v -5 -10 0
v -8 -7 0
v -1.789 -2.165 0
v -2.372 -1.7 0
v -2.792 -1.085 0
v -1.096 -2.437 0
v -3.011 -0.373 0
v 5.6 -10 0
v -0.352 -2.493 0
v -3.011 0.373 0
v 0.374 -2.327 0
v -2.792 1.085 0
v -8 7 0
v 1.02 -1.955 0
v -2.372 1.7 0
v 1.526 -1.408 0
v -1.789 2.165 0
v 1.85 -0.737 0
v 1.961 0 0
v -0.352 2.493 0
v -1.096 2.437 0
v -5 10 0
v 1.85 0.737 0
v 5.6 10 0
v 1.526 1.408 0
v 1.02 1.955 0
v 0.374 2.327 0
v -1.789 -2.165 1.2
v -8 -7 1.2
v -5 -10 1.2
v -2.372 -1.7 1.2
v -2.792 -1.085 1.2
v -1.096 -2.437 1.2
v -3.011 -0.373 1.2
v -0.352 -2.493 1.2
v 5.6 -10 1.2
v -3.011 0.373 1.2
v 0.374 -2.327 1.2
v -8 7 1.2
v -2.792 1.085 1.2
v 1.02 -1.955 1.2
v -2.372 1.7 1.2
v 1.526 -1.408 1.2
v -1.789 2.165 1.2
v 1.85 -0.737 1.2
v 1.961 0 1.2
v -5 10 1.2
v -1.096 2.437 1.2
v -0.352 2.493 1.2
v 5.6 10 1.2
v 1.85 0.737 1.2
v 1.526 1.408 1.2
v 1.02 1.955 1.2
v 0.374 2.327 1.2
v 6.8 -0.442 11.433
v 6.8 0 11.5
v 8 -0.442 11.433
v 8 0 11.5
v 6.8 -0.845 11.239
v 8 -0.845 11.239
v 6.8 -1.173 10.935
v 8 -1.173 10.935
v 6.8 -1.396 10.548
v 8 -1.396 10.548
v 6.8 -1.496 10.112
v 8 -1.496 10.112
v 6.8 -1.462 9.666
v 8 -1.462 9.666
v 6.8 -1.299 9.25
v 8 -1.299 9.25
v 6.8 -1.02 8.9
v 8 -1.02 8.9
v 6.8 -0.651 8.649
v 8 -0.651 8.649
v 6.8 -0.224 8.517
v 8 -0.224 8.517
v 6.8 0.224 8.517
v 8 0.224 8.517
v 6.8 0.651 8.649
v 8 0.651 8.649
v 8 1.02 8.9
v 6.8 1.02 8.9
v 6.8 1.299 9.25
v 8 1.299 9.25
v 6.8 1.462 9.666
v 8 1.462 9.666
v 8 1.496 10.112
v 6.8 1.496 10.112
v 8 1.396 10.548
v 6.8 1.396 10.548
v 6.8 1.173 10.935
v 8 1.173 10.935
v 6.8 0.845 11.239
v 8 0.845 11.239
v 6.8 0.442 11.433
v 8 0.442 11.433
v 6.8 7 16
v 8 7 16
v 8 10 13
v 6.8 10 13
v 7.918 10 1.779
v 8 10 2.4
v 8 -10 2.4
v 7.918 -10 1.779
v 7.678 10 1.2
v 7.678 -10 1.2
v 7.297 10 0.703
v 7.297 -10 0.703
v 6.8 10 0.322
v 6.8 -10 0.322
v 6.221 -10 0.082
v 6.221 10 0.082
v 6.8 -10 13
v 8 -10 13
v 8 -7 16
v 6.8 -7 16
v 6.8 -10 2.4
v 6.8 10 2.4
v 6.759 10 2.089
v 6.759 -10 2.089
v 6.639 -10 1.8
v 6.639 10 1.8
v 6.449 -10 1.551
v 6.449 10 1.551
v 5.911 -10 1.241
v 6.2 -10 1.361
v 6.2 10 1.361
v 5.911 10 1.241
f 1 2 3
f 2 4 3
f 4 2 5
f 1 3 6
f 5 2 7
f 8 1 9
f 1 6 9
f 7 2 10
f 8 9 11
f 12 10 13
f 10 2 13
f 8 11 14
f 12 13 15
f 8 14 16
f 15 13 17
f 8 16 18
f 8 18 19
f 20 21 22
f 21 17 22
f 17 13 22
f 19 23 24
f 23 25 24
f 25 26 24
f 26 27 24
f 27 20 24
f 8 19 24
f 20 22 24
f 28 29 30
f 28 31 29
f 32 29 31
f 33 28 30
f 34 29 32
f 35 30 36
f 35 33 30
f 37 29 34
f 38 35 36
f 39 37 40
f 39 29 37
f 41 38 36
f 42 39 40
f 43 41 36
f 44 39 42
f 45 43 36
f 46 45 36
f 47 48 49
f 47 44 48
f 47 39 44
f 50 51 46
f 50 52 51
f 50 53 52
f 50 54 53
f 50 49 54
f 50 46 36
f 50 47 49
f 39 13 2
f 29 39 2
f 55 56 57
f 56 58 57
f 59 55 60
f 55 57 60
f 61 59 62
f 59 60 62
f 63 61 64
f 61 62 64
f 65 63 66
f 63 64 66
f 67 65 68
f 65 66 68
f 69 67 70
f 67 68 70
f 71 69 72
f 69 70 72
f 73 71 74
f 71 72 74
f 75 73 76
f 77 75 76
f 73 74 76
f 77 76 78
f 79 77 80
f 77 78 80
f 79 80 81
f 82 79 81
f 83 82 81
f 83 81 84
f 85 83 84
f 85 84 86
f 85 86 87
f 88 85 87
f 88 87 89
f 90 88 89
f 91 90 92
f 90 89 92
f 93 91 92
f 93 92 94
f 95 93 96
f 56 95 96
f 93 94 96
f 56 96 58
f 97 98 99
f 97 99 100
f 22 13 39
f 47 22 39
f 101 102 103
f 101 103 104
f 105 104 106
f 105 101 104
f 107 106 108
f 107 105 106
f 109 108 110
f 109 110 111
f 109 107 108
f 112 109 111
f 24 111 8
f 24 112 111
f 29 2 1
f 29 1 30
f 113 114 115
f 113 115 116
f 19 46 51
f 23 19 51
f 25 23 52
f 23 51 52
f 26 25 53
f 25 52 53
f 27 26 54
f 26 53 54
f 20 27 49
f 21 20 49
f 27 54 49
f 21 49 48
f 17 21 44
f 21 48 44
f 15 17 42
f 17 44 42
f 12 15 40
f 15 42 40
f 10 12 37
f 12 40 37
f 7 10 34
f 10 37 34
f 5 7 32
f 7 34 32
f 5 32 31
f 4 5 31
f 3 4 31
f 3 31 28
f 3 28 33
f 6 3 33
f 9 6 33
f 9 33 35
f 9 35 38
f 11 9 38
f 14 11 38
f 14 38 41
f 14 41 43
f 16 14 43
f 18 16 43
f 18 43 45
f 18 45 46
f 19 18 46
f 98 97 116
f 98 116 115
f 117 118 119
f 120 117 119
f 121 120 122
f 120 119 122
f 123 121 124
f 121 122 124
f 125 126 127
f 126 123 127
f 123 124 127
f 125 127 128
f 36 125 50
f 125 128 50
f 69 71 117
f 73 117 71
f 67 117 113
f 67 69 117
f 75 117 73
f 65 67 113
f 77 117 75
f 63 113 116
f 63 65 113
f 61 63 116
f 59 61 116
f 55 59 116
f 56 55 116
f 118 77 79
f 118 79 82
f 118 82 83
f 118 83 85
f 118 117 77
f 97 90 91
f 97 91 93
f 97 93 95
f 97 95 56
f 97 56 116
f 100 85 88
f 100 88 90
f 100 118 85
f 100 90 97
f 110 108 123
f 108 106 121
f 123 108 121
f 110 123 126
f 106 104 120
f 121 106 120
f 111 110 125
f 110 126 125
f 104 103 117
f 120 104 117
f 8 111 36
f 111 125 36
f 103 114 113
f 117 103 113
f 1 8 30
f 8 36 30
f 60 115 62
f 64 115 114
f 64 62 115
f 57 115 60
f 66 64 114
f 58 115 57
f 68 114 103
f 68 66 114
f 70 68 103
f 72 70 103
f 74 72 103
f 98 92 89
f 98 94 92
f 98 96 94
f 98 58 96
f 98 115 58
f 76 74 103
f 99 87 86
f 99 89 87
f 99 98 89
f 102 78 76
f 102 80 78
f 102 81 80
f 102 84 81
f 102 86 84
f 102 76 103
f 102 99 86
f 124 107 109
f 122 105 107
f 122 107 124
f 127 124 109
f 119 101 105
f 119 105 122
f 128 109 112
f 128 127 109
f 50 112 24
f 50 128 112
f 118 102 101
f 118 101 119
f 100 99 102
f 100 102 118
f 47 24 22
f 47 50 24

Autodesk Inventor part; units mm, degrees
ref_plane "YZ Plane" through (0, 0, 0) normal (1, 0, 0) x (0, 1, 0)
ref_plane "XZ Plane" through (0, 0, 0) normal (0, 1, 0) x (-1, 0, 0)
ref_plane "XY Plane" through (0, 0, 0) normal (0, 0, 1) x (1, 0, 0)
sketch "Sketch1" plane through (0, 0, 0) normal (0, 0, 1) x (1, 0, 0)
  line L0 (-8, -10) -> (8, -10)
  line L1 (8, -10) -> (8, 10)
  line L2 (8, 10) -> (-8, 10)
  line L3 (-8, 10) -> (-8, -10)
  line L4 (-8, -10) -> (8, 10) construction
  line L5 (8, -10) -> (-8, 10) construction
  point P0 (0, 0)
  dimension "d0" = 16
  dimension "d1" = 20
extrude "Plate1" add sketch "Sketch1" along normal blind 1.2
sketch "Sketch2" plane through (6.8, 10, 0) normal (1, 0, 0) x (0, 1, 0)
  line L0 (-20, 0) -> (0, 0)
  line L1 (0, 0) -> (0, 16)
  line L2 (0, 16) -> (-20, 16)
  line L3 (-20, 16) -> (-20, 0)
edge flange "Flange1" height 16 angle 90 thickness 1.2 bend radius 1.2 thickness toward (1, 0, 0) relief tear relief width 1.2 relief depth 0.6 edges at (8, 0, 1.2) wall of the first edge with corners at (6.8, -10, 0) (6.8, 10, 0) (6.8, 10, 16) (6.8, -10, 16)
bend "Bend1"
corner "Corner1"
chamfer "Corner Chamfer1" distance 3 angle 45 4 edges at (-8, 10, 0.6) (-8, -10, 0.6) (7.4, -10, 16) (7.4, 10, 16)
sketch "Sketch3" plane through (6.8, -10, 2.4) normal (-1, 0, 0) x (0, 0, 1)
  line L0 (13.6, 3) -> (13.6, 17) projected
  line L1 (-2.4, 17) -> (-2.4, 3) projected
  point P0 (-2.4, 10)
  point P1 (7.6, 10)
  point P2 (-2.4, 10)
  dimension "d16" = 6
hole "Hole1" at (6.8, 0, 10) direction (1, 0, 0) diameter 3 depth 1.2 tip angle 118
sketch "Sketch4" plane through (0, 0, 1.2) normal (0, 0, 1) x (1, 0, 0)
  circle A0 centre (-0.5392, 0) radius 2.1 construction
  circle A1 centre (-0.5392, 0) radius 2.5
  point P0 (0, 0)
  dimension "d24" = 0.4
extrude "Cut1" cut sketch "Sketch4" against normal blind 1.2
equation "\"d22\" = Thickness"
equation "\"d25\" = Thickness"
equation "\"d3\" = BendReliefWidth"
equation "\"d4\" = BendReliefDepth"
equation "\"d5\" = MinimumRemnant"
equation "\"d6\" = BendRadius"
equation "\"d9\" = BendRadius"
equation "\"d10\" = CornerReliefSize"
equation "\"d11\" = GapSize"
equation "\"d12\" = JacobiRadiusSize"
equation "\"BendRadius\" = Thickness"
equation "\"BendReliefWidth\" = Thickness"
equation "\"BendReliefDepth\" = 0.5 * Thickness"
equation "\"CornerReliefSize\" = 4 * Thickness"
equation "\"MinimumRemnant\" = 2 * Thickness"
equation "\"TransitionRadius\" = BendRadius"
equation "\"JacobiRadiusSize\" = BendRadius"
equation "\"GapSize\" = Thickness"
equation "\"d2\" = BendRadius"
equation "\"Thickness\" = 1.2"
